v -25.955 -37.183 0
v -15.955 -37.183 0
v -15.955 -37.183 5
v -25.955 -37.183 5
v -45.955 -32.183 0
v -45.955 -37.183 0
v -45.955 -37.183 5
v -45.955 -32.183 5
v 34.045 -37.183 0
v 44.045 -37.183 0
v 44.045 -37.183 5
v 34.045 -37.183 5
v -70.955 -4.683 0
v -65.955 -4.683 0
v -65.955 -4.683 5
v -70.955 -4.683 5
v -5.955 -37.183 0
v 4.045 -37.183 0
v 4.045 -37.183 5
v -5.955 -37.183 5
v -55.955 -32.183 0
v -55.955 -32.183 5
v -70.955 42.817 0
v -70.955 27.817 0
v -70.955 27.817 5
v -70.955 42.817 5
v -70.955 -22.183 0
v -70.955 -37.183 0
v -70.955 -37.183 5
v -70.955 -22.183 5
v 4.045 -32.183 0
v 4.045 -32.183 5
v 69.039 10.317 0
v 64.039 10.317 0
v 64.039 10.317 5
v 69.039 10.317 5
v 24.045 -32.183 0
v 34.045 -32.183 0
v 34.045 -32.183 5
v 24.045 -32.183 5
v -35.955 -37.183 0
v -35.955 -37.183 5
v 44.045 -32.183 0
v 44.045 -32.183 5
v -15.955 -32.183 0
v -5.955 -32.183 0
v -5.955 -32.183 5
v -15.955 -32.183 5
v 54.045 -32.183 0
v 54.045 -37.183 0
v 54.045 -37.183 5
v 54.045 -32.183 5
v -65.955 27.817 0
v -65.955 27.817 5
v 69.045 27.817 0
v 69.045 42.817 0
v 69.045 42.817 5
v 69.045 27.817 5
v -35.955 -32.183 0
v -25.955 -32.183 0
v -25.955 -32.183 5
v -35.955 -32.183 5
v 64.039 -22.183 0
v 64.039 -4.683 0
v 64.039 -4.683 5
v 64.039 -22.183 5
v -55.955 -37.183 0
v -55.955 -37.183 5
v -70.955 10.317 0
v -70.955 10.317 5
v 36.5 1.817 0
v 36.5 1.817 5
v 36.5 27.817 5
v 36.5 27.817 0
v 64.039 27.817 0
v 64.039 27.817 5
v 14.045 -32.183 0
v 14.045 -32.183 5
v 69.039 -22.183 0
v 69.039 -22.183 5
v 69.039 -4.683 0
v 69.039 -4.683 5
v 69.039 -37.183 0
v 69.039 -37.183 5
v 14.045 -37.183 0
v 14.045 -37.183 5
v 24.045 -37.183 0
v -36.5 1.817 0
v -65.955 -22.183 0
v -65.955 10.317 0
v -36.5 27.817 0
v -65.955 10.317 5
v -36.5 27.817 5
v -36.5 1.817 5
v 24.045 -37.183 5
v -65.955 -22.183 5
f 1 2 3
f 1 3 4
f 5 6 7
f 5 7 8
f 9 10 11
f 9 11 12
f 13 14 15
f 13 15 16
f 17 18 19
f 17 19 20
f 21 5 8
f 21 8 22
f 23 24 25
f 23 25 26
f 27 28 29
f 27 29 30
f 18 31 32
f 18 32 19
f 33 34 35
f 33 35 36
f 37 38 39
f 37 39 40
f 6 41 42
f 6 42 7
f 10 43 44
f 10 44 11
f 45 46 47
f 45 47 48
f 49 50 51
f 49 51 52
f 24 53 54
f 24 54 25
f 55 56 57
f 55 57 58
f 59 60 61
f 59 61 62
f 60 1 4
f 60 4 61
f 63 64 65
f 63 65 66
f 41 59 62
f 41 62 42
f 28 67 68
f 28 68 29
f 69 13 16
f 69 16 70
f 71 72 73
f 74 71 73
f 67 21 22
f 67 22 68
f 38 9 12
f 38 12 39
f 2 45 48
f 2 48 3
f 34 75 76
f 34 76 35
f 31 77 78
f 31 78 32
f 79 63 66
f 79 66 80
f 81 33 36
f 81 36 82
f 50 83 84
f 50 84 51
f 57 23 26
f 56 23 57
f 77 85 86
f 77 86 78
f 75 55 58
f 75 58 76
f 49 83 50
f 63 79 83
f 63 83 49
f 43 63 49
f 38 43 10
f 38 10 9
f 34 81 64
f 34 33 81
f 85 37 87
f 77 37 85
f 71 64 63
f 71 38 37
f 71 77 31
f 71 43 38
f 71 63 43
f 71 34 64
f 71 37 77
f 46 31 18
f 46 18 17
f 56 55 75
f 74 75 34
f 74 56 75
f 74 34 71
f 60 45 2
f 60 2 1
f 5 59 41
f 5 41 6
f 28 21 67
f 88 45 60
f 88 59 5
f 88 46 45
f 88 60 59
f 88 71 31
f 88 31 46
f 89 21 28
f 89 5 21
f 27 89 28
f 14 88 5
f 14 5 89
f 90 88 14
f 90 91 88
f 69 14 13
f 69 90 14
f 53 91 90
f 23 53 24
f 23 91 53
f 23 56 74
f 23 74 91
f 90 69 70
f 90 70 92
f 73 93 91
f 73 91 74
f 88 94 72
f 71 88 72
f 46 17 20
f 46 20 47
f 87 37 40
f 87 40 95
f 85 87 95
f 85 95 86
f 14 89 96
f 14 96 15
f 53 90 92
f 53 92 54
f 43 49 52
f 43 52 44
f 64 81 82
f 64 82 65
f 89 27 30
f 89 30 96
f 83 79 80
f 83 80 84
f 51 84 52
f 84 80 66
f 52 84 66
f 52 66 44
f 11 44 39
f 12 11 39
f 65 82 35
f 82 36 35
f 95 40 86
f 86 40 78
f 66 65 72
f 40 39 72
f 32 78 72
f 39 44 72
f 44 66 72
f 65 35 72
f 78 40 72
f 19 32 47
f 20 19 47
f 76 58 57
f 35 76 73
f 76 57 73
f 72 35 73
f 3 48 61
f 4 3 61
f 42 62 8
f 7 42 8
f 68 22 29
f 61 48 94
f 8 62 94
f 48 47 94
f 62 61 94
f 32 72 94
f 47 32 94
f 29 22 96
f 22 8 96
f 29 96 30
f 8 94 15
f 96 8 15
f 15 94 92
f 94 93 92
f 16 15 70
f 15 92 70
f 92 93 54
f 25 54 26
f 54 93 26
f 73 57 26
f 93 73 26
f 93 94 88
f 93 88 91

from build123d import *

# Parameters (mm, degrees)
BOSS_EXTRUDE1_DEPTH = 5
SKETCH3_W           = 73
SKETCH3_H           = 26
CUT_EXTRUDE1_DEPTH  = 84.023651357


with BuildPart() as part:
    # Sketch1 → Boss-Extrude1 (new body)
    with BuildSketch(Plane.XY):
        Polygon((69.038630962, -4.683293815), (64.038630962, -4.683293815), (64.038630962, -22.183293815), (69.038630962, -22.183293815), (69.038630962, -37.183293815), (54.044687612, -37.183293815), (54.044687612, -32.183293815), (44.044687612, -32.183293815), (44.044687612, -37.183293815), (34.044687612, -37.183293815), (34.044687612, -32.183293815), (24.044687612, -32.183293815), (24.044687612, -37.183293815), (14.044687612, -37.183293815), (14.044687612, -32.183293815), (4.044687612, -32.183293815), (4.044687612, -37.183293815), (-5.955312388, -37.183293815), (-5.955312388, -32.183293815), (-15.955312388, -32.183293815), (-15.955312388, -37.183293815), (-25.955312388, -37.183293815), (-25.955312388, -32.183293815), (-35.955312388, -32.183293815), (-35.955312388, -37.183293815), (-45.955312388, -37.183293815), (-45.955312388, -32.183293815), (-55.955312388, -32.183293815), (-55.955312388, -37.183293815), (-70.955312388, -37.183293815), (-70.955312388, -22.183293815), (-65.955312388, -22.183293815), (-65.955312388, -4.683293815), (-70.955312388, -4.683293815), (-70.955312388, 10.316706185), (-65.955312388, 10.316706185), (-65.955312388, 27.816706185), (-70.955312388, 27.816706185), (-70.955312388, 42.816706185), (69.044687612, 42.816706185), (69.044687612, 27.816706185), (64.038630962, 27.816706185), (64.038630962, 10.316706185), (69.038630962, 10.316706185), align=None)
    extrude(amount=BOSS_EXTRUDE1_DEPTH)

    # Sketch3 → Cut-Extrude1 (cut, through all)
    with BuildSketch(Plane.XY.offset(5)):
        with Locations((0, 14.816706185)):
            Rectangle(SKETCH3_W, SKETCH3_H)
    extrude(amount=-CUT_EXTRUDE1_DEPTH, mode=Mode.SUBTRACT)


solid = part.part
